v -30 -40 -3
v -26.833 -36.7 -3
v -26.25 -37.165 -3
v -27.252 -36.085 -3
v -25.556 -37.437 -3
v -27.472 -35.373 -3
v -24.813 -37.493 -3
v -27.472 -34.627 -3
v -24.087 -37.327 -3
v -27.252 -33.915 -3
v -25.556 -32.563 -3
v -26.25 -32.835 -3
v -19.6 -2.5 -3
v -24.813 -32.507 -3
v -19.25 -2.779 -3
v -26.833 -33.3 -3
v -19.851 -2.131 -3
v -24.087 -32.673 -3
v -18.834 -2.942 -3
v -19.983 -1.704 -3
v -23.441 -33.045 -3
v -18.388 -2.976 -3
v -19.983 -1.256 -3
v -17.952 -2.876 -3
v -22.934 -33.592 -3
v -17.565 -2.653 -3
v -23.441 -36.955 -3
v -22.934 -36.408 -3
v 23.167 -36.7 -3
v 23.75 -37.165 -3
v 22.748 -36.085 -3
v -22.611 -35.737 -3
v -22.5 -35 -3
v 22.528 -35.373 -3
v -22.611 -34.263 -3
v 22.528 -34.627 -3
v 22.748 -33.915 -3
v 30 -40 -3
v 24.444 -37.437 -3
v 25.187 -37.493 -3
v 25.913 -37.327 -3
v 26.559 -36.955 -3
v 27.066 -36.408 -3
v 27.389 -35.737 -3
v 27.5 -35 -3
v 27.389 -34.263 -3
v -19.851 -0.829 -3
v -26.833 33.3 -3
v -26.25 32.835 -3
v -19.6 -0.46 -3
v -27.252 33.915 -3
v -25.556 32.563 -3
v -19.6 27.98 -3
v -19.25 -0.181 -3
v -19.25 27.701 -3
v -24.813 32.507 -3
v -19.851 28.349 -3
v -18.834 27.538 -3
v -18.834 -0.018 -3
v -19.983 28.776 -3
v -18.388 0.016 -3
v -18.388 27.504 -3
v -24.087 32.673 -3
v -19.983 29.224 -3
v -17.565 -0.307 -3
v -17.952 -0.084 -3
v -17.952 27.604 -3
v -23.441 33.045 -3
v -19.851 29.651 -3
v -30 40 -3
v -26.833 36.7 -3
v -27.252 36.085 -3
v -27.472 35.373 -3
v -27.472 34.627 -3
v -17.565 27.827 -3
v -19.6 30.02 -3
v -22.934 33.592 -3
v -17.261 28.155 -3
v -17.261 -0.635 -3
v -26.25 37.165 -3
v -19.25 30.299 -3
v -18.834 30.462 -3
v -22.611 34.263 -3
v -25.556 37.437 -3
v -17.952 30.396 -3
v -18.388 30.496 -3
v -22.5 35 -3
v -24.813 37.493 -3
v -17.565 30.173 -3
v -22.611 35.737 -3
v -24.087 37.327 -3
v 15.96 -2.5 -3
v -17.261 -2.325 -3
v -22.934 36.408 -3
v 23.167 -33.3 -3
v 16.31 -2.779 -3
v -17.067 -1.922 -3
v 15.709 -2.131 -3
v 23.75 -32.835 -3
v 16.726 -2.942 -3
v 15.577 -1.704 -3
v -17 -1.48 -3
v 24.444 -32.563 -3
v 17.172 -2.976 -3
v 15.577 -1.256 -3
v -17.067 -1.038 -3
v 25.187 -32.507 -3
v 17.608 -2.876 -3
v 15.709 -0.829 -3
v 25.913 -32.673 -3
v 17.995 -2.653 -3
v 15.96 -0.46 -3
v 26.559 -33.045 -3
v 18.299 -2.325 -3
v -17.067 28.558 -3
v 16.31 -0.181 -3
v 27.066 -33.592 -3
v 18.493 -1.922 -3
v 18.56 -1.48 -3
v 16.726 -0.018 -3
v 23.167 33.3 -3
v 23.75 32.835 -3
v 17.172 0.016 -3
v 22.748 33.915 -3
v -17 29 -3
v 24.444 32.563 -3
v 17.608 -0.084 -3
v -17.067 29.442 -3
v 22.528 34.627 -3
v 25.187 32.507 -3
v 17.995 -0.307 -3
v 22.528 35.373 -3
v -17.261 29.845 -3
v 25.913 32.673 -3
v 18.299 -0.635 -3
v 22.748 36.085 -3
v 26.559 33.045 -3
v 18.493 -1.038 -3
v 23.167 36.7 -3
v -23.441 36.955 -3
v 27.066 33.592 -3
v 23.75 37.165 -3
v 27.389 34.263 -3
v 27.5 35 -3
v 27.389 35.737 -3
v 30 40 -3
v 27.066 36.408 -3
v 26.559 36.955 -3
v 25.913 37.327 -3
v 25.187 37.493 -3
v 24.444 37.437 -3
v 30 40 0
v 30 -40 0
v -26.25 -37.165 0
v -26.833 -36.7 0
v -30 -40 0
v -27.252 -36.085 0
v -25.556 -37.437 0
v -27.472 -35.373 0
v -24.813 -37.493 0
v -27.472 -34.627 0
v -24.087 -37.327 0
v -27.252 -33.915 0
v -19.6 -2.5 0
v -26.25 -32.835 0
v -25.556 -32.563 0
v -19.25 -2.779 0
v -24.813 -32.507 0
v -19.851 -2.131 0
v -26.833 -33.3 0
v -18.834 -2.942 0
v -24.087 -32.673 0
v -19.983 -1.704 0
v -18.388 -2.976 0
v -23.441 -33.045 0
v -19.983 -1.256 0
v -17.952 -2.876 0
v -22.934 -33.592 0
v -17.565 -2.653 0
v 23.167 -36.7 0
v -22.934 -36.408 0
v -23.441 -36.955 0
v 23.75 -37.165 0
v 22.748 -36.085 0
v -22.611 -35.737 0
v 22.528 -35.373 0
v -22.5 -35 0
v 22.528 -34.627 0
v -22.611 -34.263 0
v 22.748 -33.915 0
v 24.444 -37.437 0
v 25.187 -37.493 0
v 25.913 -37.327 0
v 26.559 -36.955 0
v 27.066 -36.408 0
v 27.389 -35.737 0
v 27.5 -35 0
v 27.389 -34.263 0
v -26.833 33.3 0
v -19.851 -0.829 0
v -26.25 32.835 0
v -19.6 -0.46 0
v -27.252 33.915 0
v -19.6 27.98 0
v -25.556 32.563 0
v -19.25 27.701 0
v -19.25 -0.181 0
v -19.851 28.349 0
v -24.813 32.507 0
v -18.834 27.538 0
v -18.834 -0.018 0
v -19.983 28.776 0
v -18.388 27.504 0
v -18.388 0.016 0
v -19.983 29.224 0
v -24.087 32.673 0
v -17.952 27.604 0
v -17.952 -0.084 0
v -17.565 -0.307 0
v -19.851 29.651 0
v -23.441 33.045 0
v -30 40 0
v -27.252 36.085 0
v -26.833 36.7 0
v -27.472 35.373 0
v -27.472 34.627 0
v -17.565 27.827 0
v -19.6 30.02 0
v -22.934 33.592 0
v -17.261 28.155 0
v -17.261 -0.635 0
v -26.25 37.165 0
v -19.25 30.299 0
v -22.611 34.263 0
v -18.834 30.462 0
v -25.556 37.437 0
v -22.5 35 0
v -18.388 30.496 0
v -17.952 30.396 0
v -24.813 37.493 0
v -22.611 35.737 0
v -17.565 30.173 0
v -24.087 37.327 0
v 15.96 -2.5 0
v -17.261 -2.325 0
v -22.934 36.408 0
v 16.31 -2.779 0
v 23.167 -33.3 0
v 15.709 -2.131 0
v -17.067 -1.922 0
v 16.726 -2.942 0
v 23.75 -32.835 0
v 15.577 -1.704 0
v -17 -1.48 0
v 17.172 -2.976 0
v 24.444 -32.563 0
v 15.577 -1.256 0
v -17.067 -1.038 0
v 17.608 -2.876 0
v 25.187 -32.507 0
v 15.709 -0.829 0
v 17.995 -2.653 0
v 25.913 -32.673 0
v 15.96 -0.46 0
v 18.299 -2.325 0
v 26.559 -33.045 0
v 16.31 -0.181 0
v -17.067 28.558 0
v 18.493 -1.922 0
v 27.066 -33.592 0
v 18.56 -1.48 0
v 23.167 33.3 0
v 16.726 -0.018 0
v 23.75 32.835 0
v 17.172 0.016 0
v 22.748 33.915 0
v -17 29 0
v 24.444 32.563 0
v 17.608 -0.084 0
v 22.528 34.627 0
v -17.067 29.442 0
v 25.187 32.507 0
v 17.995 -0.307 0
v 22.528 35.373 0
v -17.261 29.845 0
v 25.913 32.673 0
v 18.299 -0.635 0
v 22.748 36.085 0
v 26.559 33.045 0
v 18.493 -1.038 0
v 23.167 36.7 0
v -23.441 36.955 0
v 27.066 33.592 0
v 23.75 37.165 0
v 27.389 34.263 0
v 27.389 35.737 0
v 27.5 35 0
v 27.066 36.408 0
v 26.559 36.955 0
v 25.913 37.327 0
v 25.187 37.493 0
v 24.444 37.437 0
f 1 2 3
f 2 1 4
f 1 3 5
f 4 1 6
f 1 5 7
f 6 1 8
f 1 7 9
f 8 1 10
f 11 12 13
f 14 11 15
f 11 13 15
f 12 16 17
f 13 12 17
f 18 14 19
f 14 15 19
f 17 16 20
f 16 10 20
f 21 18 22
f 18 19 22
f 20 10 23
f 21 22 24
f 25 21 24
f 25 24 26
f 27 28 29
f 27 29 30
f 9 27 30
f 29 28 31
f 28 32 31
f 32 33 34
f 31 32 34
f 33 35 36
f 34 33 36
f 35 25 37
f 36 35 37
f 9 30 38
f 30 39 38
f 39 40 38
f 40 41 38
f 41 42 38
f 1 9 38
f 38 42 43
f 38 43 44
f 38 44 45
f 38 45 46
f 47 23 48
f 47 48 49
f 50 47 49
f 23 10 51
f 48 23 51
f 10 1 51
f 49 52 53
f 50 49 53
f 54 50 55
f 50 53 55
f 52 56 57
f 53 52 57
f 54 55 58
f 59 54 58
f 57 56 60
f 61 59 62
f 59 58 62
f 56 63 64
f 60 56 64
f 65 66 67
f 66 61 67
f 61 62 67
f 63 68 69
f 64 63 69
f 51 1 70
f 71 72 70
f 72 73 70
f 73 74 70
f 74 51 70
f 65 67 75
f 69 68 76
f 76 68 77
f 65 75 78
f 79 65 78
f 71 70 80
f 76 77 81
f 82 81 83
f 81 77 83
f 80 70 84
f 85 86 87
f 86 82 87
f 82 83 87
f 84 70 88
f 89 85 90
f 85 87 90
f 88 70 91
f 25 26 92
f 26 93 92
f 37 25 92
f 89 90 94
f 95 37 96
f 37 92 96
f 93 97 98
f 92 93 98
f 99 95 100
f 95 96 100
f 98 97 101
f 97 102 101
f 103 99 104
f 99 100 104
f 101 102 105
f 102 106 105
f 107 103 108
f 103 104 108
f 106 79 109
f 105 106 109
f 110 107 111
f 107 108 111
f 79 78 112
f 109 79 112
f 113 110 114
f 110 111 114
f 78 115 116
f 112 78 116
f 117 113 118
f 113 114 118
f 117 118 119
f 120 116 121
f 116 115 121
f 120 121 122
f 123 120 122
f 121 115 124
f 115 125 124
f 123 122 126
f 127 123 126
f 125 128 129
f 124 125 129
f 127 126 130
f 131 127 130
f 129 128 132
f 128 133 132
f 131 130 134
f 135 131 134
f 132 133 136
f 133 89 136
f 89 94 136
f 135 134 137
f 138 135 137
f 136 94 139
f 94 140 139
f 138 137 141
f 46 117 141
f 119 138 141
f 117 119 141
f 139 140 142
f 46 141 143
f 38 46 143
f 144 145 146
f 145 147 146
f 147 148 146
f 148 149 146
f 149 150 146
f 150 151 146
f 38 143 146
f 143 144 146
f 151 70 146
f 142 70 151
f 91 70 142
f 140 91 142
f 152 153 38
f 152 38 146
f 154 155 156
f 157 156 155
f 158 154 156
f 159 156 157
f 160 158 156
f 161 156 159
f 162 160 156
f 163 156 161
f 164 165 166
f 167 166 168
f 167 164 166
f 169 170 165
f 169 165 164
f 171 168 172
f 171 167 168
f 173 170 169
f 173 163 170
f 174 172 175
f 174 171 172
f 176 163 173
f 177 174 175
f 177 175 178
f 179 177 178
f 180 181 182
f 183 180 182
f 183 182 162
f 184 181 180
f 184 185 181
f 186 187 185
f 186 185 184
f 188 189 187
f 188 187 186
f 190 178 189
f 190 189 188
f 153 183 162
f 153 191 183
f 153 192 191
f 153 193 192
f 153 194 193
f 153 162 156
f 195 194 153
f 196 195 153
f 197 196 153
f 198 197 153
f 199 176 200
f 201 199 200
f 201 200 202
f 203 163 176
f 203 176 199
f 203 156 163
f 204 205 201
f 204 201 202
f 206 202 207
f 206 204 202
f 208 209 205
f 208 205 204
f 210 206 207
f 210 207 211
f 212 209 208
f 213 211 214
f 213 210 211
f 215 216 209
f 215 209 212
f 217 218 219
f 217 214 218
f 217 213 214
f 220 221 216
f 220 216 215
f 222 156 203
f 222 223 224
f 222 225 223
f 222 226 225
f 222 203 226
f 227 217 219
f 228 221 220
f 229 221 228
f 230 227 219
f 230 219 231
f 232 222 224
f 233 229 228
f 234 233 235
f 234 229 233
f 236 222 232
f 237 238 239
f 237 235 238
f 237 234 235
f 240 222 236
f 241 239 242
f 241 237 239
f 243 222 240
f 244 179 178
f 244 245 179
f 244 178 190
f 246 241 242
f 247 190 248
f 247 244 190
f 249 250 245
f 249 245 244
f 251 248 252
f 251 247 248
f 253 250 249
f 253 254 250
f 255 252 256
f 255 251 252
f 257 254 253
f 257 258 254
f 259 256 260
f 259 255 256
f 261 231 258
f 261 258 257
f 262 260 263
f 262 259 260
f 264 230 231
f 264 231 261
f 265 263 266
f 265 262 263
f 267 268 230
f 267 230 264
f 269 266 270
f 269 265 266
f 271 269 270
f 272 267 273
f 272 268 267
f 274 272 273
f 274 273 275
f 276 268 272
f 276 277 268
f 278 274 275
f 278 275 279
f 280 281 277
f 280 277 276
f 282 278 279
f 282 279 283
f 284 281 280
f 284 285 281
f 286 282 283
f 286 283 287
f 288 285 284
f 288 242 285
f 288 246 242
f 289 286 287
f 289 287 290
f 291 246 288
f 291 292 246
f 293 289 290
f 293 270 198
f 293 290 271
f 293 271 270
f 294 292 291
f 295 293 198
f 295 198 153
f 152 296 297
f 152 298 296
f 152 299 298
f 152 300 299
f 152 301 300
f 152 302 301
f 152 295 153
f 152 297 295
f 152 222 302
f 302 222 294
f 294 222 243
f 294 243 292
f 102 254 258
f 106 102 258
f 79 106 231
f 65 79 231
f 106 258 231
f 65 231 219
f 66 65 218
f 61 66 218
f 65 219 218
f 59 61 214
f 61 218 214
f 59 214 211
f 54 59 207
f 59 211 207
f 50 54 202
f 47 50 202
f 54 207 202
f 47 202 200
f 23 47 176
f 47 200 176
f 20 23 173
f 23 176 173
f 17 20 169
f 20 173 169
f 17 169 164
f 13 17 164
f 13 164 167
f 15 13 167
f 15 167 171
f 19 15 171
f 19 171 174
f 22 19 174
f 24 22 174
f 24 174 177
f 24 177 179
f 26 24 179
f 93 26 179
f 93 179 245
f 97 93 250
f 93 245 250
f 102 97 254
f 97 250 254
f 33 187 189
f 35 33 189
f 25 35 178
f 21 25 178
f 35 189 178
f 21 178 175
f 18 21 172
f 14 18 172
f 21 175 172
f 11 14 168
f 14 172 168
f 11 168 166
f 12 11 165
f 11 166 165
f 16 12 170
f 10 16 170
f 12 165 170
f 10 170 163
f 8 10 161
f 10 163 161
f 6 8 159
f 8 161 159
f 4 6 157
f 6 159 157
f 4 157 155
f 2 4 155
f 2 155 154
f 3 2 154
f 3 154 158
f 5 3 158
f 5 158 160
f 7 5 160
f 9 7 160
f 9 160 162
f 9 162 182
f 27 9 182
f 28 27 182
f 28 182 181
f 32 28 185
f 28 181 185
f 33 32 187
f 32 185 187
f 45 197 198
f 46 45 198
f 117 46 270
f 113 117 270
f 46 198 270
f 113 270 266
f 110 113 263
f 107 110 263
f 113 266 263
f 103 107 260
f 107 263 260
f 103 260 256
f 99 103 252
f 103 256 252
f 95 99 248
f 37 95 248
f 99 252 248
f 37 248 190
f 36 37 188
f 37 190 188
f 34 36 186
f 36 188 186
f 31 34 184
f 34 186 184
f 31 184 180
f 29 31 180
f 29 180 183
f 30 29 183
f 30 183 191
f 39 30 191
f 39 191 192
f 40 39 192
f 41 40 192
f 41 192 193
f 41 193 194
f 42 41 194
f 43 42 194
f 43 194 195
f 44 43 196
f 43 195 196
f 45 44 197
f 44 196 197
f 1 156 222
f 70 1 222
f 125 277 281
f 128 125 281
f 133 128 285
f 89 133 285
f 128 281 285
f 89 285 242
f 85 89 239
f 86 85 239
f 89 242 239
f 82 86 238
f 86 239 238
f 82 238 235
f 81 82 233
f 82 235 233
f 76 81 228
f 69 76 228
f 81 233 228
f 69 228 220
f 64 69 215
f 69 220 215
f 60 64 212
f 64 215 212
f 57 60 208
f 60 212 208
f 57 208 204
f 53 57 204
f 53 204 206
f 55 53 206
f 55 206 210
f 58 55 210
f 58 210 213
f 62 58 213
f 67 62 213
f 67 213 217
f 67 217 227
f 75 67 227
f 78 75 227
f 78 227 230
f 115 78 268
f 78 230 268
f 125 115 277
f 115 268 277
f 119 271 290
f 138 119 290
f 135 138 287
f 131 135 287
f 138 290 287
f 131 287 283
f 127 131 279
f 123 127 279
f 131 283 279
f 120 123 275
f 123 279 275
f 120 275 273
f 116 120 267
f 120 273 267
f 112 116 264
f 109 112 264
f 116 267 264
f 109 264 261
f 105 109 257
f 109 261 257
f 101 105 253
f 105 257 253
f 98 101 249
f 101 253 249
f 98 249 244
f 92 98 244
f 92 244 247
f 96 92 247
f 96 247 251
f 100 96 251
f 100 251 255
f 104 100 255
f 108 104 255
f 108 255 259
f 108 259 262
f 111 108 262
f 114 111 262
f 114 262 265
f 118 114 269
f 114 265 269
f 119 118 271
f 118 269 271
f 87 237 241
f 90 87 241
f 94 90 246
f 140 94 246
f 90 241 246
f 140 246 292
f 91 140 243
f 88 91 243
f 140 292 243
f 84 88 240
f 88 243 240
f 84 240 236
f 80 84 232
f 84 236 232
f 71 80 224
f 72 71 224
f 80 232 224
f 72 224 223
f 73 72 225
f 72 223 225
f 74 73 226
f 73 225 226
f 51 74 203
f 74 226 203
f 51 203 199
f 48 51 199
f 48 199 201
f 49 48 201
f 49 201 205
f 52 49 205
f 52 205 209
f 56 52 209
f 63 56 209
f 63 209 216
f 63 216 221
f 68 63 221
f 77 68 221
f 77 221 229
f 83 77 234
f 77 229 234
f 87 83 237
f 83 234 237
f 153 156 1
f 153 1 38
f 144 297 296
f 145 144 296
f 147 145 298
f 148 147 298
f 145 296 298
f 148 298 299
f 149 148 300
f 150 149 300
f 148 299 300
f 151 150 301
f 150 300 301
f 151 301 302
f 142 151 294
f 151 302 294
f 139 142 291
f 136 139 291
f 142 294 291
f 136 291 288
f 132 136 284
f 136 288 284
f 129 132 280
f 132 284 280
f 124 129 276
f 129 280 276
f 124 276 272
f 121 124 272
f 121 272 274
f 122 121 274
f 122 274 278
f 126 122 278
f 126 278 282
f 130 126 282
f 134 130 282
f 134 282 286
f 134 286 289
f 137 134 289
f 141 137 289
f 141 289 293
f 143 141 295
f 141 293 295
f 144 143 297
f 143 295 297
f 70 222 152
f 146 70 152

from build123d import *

# Parameters (mm, degrees)
SKETCH1_W           = 60
SKETCH1_H           = 80
BOSS_EXTRUDE1_DEPTH = 3
SKETCH2_R           = 2.5
CUT_EXTRUDE1_DEPTH  = 3
SKETCH3_R           = 1.5
CUT_EXTRUDE2_DEPTH  = 3


with BuildPart() as part:
    # Sketch1 → Boss-Extrude1 (new body)
    with BuildSketch(Plane.XY):
        Rectangle(SKETCH1_W, SKETCH1_H)
    extrude(amount=-BOSS_EXTRUDE1_DEPTH)

    # Sketch2 → Cut-Extrude1 (cut)
    with BuildSketch(Plane.XY):
        with Locations((-25, 35)):
            Circle(SKETCH2_R)
        with Locations((-25, -35)):
            Circle(SKETCH2_R)
        with Locations((25, -35)):
            Circle(SKETCH2_R)
        with Locations((25, 35)):
            Circle(SKETCH2_R)
    extrude(amount=-CUT_EXTRUDE1_DEPTH, mode=Mode.SUBTRACT)

    # Sketch3 → Cut-Extrude2 (cut)
    with BuildSketch(Plane.XY):
        with Locations((-18.5, 29)):
            Circle(SKETCH3_R)
        with Locations((-18.5, -1.48)):
            Circle(SKETCH3_R)
        with Locations((17.06, -1.48)):
            Circle(SKETCH3_R)
    extrude(amount=-CUT_EXTRUDE2_DEPTH, mode=Mode.SUBTRACT)


solid = part.part
